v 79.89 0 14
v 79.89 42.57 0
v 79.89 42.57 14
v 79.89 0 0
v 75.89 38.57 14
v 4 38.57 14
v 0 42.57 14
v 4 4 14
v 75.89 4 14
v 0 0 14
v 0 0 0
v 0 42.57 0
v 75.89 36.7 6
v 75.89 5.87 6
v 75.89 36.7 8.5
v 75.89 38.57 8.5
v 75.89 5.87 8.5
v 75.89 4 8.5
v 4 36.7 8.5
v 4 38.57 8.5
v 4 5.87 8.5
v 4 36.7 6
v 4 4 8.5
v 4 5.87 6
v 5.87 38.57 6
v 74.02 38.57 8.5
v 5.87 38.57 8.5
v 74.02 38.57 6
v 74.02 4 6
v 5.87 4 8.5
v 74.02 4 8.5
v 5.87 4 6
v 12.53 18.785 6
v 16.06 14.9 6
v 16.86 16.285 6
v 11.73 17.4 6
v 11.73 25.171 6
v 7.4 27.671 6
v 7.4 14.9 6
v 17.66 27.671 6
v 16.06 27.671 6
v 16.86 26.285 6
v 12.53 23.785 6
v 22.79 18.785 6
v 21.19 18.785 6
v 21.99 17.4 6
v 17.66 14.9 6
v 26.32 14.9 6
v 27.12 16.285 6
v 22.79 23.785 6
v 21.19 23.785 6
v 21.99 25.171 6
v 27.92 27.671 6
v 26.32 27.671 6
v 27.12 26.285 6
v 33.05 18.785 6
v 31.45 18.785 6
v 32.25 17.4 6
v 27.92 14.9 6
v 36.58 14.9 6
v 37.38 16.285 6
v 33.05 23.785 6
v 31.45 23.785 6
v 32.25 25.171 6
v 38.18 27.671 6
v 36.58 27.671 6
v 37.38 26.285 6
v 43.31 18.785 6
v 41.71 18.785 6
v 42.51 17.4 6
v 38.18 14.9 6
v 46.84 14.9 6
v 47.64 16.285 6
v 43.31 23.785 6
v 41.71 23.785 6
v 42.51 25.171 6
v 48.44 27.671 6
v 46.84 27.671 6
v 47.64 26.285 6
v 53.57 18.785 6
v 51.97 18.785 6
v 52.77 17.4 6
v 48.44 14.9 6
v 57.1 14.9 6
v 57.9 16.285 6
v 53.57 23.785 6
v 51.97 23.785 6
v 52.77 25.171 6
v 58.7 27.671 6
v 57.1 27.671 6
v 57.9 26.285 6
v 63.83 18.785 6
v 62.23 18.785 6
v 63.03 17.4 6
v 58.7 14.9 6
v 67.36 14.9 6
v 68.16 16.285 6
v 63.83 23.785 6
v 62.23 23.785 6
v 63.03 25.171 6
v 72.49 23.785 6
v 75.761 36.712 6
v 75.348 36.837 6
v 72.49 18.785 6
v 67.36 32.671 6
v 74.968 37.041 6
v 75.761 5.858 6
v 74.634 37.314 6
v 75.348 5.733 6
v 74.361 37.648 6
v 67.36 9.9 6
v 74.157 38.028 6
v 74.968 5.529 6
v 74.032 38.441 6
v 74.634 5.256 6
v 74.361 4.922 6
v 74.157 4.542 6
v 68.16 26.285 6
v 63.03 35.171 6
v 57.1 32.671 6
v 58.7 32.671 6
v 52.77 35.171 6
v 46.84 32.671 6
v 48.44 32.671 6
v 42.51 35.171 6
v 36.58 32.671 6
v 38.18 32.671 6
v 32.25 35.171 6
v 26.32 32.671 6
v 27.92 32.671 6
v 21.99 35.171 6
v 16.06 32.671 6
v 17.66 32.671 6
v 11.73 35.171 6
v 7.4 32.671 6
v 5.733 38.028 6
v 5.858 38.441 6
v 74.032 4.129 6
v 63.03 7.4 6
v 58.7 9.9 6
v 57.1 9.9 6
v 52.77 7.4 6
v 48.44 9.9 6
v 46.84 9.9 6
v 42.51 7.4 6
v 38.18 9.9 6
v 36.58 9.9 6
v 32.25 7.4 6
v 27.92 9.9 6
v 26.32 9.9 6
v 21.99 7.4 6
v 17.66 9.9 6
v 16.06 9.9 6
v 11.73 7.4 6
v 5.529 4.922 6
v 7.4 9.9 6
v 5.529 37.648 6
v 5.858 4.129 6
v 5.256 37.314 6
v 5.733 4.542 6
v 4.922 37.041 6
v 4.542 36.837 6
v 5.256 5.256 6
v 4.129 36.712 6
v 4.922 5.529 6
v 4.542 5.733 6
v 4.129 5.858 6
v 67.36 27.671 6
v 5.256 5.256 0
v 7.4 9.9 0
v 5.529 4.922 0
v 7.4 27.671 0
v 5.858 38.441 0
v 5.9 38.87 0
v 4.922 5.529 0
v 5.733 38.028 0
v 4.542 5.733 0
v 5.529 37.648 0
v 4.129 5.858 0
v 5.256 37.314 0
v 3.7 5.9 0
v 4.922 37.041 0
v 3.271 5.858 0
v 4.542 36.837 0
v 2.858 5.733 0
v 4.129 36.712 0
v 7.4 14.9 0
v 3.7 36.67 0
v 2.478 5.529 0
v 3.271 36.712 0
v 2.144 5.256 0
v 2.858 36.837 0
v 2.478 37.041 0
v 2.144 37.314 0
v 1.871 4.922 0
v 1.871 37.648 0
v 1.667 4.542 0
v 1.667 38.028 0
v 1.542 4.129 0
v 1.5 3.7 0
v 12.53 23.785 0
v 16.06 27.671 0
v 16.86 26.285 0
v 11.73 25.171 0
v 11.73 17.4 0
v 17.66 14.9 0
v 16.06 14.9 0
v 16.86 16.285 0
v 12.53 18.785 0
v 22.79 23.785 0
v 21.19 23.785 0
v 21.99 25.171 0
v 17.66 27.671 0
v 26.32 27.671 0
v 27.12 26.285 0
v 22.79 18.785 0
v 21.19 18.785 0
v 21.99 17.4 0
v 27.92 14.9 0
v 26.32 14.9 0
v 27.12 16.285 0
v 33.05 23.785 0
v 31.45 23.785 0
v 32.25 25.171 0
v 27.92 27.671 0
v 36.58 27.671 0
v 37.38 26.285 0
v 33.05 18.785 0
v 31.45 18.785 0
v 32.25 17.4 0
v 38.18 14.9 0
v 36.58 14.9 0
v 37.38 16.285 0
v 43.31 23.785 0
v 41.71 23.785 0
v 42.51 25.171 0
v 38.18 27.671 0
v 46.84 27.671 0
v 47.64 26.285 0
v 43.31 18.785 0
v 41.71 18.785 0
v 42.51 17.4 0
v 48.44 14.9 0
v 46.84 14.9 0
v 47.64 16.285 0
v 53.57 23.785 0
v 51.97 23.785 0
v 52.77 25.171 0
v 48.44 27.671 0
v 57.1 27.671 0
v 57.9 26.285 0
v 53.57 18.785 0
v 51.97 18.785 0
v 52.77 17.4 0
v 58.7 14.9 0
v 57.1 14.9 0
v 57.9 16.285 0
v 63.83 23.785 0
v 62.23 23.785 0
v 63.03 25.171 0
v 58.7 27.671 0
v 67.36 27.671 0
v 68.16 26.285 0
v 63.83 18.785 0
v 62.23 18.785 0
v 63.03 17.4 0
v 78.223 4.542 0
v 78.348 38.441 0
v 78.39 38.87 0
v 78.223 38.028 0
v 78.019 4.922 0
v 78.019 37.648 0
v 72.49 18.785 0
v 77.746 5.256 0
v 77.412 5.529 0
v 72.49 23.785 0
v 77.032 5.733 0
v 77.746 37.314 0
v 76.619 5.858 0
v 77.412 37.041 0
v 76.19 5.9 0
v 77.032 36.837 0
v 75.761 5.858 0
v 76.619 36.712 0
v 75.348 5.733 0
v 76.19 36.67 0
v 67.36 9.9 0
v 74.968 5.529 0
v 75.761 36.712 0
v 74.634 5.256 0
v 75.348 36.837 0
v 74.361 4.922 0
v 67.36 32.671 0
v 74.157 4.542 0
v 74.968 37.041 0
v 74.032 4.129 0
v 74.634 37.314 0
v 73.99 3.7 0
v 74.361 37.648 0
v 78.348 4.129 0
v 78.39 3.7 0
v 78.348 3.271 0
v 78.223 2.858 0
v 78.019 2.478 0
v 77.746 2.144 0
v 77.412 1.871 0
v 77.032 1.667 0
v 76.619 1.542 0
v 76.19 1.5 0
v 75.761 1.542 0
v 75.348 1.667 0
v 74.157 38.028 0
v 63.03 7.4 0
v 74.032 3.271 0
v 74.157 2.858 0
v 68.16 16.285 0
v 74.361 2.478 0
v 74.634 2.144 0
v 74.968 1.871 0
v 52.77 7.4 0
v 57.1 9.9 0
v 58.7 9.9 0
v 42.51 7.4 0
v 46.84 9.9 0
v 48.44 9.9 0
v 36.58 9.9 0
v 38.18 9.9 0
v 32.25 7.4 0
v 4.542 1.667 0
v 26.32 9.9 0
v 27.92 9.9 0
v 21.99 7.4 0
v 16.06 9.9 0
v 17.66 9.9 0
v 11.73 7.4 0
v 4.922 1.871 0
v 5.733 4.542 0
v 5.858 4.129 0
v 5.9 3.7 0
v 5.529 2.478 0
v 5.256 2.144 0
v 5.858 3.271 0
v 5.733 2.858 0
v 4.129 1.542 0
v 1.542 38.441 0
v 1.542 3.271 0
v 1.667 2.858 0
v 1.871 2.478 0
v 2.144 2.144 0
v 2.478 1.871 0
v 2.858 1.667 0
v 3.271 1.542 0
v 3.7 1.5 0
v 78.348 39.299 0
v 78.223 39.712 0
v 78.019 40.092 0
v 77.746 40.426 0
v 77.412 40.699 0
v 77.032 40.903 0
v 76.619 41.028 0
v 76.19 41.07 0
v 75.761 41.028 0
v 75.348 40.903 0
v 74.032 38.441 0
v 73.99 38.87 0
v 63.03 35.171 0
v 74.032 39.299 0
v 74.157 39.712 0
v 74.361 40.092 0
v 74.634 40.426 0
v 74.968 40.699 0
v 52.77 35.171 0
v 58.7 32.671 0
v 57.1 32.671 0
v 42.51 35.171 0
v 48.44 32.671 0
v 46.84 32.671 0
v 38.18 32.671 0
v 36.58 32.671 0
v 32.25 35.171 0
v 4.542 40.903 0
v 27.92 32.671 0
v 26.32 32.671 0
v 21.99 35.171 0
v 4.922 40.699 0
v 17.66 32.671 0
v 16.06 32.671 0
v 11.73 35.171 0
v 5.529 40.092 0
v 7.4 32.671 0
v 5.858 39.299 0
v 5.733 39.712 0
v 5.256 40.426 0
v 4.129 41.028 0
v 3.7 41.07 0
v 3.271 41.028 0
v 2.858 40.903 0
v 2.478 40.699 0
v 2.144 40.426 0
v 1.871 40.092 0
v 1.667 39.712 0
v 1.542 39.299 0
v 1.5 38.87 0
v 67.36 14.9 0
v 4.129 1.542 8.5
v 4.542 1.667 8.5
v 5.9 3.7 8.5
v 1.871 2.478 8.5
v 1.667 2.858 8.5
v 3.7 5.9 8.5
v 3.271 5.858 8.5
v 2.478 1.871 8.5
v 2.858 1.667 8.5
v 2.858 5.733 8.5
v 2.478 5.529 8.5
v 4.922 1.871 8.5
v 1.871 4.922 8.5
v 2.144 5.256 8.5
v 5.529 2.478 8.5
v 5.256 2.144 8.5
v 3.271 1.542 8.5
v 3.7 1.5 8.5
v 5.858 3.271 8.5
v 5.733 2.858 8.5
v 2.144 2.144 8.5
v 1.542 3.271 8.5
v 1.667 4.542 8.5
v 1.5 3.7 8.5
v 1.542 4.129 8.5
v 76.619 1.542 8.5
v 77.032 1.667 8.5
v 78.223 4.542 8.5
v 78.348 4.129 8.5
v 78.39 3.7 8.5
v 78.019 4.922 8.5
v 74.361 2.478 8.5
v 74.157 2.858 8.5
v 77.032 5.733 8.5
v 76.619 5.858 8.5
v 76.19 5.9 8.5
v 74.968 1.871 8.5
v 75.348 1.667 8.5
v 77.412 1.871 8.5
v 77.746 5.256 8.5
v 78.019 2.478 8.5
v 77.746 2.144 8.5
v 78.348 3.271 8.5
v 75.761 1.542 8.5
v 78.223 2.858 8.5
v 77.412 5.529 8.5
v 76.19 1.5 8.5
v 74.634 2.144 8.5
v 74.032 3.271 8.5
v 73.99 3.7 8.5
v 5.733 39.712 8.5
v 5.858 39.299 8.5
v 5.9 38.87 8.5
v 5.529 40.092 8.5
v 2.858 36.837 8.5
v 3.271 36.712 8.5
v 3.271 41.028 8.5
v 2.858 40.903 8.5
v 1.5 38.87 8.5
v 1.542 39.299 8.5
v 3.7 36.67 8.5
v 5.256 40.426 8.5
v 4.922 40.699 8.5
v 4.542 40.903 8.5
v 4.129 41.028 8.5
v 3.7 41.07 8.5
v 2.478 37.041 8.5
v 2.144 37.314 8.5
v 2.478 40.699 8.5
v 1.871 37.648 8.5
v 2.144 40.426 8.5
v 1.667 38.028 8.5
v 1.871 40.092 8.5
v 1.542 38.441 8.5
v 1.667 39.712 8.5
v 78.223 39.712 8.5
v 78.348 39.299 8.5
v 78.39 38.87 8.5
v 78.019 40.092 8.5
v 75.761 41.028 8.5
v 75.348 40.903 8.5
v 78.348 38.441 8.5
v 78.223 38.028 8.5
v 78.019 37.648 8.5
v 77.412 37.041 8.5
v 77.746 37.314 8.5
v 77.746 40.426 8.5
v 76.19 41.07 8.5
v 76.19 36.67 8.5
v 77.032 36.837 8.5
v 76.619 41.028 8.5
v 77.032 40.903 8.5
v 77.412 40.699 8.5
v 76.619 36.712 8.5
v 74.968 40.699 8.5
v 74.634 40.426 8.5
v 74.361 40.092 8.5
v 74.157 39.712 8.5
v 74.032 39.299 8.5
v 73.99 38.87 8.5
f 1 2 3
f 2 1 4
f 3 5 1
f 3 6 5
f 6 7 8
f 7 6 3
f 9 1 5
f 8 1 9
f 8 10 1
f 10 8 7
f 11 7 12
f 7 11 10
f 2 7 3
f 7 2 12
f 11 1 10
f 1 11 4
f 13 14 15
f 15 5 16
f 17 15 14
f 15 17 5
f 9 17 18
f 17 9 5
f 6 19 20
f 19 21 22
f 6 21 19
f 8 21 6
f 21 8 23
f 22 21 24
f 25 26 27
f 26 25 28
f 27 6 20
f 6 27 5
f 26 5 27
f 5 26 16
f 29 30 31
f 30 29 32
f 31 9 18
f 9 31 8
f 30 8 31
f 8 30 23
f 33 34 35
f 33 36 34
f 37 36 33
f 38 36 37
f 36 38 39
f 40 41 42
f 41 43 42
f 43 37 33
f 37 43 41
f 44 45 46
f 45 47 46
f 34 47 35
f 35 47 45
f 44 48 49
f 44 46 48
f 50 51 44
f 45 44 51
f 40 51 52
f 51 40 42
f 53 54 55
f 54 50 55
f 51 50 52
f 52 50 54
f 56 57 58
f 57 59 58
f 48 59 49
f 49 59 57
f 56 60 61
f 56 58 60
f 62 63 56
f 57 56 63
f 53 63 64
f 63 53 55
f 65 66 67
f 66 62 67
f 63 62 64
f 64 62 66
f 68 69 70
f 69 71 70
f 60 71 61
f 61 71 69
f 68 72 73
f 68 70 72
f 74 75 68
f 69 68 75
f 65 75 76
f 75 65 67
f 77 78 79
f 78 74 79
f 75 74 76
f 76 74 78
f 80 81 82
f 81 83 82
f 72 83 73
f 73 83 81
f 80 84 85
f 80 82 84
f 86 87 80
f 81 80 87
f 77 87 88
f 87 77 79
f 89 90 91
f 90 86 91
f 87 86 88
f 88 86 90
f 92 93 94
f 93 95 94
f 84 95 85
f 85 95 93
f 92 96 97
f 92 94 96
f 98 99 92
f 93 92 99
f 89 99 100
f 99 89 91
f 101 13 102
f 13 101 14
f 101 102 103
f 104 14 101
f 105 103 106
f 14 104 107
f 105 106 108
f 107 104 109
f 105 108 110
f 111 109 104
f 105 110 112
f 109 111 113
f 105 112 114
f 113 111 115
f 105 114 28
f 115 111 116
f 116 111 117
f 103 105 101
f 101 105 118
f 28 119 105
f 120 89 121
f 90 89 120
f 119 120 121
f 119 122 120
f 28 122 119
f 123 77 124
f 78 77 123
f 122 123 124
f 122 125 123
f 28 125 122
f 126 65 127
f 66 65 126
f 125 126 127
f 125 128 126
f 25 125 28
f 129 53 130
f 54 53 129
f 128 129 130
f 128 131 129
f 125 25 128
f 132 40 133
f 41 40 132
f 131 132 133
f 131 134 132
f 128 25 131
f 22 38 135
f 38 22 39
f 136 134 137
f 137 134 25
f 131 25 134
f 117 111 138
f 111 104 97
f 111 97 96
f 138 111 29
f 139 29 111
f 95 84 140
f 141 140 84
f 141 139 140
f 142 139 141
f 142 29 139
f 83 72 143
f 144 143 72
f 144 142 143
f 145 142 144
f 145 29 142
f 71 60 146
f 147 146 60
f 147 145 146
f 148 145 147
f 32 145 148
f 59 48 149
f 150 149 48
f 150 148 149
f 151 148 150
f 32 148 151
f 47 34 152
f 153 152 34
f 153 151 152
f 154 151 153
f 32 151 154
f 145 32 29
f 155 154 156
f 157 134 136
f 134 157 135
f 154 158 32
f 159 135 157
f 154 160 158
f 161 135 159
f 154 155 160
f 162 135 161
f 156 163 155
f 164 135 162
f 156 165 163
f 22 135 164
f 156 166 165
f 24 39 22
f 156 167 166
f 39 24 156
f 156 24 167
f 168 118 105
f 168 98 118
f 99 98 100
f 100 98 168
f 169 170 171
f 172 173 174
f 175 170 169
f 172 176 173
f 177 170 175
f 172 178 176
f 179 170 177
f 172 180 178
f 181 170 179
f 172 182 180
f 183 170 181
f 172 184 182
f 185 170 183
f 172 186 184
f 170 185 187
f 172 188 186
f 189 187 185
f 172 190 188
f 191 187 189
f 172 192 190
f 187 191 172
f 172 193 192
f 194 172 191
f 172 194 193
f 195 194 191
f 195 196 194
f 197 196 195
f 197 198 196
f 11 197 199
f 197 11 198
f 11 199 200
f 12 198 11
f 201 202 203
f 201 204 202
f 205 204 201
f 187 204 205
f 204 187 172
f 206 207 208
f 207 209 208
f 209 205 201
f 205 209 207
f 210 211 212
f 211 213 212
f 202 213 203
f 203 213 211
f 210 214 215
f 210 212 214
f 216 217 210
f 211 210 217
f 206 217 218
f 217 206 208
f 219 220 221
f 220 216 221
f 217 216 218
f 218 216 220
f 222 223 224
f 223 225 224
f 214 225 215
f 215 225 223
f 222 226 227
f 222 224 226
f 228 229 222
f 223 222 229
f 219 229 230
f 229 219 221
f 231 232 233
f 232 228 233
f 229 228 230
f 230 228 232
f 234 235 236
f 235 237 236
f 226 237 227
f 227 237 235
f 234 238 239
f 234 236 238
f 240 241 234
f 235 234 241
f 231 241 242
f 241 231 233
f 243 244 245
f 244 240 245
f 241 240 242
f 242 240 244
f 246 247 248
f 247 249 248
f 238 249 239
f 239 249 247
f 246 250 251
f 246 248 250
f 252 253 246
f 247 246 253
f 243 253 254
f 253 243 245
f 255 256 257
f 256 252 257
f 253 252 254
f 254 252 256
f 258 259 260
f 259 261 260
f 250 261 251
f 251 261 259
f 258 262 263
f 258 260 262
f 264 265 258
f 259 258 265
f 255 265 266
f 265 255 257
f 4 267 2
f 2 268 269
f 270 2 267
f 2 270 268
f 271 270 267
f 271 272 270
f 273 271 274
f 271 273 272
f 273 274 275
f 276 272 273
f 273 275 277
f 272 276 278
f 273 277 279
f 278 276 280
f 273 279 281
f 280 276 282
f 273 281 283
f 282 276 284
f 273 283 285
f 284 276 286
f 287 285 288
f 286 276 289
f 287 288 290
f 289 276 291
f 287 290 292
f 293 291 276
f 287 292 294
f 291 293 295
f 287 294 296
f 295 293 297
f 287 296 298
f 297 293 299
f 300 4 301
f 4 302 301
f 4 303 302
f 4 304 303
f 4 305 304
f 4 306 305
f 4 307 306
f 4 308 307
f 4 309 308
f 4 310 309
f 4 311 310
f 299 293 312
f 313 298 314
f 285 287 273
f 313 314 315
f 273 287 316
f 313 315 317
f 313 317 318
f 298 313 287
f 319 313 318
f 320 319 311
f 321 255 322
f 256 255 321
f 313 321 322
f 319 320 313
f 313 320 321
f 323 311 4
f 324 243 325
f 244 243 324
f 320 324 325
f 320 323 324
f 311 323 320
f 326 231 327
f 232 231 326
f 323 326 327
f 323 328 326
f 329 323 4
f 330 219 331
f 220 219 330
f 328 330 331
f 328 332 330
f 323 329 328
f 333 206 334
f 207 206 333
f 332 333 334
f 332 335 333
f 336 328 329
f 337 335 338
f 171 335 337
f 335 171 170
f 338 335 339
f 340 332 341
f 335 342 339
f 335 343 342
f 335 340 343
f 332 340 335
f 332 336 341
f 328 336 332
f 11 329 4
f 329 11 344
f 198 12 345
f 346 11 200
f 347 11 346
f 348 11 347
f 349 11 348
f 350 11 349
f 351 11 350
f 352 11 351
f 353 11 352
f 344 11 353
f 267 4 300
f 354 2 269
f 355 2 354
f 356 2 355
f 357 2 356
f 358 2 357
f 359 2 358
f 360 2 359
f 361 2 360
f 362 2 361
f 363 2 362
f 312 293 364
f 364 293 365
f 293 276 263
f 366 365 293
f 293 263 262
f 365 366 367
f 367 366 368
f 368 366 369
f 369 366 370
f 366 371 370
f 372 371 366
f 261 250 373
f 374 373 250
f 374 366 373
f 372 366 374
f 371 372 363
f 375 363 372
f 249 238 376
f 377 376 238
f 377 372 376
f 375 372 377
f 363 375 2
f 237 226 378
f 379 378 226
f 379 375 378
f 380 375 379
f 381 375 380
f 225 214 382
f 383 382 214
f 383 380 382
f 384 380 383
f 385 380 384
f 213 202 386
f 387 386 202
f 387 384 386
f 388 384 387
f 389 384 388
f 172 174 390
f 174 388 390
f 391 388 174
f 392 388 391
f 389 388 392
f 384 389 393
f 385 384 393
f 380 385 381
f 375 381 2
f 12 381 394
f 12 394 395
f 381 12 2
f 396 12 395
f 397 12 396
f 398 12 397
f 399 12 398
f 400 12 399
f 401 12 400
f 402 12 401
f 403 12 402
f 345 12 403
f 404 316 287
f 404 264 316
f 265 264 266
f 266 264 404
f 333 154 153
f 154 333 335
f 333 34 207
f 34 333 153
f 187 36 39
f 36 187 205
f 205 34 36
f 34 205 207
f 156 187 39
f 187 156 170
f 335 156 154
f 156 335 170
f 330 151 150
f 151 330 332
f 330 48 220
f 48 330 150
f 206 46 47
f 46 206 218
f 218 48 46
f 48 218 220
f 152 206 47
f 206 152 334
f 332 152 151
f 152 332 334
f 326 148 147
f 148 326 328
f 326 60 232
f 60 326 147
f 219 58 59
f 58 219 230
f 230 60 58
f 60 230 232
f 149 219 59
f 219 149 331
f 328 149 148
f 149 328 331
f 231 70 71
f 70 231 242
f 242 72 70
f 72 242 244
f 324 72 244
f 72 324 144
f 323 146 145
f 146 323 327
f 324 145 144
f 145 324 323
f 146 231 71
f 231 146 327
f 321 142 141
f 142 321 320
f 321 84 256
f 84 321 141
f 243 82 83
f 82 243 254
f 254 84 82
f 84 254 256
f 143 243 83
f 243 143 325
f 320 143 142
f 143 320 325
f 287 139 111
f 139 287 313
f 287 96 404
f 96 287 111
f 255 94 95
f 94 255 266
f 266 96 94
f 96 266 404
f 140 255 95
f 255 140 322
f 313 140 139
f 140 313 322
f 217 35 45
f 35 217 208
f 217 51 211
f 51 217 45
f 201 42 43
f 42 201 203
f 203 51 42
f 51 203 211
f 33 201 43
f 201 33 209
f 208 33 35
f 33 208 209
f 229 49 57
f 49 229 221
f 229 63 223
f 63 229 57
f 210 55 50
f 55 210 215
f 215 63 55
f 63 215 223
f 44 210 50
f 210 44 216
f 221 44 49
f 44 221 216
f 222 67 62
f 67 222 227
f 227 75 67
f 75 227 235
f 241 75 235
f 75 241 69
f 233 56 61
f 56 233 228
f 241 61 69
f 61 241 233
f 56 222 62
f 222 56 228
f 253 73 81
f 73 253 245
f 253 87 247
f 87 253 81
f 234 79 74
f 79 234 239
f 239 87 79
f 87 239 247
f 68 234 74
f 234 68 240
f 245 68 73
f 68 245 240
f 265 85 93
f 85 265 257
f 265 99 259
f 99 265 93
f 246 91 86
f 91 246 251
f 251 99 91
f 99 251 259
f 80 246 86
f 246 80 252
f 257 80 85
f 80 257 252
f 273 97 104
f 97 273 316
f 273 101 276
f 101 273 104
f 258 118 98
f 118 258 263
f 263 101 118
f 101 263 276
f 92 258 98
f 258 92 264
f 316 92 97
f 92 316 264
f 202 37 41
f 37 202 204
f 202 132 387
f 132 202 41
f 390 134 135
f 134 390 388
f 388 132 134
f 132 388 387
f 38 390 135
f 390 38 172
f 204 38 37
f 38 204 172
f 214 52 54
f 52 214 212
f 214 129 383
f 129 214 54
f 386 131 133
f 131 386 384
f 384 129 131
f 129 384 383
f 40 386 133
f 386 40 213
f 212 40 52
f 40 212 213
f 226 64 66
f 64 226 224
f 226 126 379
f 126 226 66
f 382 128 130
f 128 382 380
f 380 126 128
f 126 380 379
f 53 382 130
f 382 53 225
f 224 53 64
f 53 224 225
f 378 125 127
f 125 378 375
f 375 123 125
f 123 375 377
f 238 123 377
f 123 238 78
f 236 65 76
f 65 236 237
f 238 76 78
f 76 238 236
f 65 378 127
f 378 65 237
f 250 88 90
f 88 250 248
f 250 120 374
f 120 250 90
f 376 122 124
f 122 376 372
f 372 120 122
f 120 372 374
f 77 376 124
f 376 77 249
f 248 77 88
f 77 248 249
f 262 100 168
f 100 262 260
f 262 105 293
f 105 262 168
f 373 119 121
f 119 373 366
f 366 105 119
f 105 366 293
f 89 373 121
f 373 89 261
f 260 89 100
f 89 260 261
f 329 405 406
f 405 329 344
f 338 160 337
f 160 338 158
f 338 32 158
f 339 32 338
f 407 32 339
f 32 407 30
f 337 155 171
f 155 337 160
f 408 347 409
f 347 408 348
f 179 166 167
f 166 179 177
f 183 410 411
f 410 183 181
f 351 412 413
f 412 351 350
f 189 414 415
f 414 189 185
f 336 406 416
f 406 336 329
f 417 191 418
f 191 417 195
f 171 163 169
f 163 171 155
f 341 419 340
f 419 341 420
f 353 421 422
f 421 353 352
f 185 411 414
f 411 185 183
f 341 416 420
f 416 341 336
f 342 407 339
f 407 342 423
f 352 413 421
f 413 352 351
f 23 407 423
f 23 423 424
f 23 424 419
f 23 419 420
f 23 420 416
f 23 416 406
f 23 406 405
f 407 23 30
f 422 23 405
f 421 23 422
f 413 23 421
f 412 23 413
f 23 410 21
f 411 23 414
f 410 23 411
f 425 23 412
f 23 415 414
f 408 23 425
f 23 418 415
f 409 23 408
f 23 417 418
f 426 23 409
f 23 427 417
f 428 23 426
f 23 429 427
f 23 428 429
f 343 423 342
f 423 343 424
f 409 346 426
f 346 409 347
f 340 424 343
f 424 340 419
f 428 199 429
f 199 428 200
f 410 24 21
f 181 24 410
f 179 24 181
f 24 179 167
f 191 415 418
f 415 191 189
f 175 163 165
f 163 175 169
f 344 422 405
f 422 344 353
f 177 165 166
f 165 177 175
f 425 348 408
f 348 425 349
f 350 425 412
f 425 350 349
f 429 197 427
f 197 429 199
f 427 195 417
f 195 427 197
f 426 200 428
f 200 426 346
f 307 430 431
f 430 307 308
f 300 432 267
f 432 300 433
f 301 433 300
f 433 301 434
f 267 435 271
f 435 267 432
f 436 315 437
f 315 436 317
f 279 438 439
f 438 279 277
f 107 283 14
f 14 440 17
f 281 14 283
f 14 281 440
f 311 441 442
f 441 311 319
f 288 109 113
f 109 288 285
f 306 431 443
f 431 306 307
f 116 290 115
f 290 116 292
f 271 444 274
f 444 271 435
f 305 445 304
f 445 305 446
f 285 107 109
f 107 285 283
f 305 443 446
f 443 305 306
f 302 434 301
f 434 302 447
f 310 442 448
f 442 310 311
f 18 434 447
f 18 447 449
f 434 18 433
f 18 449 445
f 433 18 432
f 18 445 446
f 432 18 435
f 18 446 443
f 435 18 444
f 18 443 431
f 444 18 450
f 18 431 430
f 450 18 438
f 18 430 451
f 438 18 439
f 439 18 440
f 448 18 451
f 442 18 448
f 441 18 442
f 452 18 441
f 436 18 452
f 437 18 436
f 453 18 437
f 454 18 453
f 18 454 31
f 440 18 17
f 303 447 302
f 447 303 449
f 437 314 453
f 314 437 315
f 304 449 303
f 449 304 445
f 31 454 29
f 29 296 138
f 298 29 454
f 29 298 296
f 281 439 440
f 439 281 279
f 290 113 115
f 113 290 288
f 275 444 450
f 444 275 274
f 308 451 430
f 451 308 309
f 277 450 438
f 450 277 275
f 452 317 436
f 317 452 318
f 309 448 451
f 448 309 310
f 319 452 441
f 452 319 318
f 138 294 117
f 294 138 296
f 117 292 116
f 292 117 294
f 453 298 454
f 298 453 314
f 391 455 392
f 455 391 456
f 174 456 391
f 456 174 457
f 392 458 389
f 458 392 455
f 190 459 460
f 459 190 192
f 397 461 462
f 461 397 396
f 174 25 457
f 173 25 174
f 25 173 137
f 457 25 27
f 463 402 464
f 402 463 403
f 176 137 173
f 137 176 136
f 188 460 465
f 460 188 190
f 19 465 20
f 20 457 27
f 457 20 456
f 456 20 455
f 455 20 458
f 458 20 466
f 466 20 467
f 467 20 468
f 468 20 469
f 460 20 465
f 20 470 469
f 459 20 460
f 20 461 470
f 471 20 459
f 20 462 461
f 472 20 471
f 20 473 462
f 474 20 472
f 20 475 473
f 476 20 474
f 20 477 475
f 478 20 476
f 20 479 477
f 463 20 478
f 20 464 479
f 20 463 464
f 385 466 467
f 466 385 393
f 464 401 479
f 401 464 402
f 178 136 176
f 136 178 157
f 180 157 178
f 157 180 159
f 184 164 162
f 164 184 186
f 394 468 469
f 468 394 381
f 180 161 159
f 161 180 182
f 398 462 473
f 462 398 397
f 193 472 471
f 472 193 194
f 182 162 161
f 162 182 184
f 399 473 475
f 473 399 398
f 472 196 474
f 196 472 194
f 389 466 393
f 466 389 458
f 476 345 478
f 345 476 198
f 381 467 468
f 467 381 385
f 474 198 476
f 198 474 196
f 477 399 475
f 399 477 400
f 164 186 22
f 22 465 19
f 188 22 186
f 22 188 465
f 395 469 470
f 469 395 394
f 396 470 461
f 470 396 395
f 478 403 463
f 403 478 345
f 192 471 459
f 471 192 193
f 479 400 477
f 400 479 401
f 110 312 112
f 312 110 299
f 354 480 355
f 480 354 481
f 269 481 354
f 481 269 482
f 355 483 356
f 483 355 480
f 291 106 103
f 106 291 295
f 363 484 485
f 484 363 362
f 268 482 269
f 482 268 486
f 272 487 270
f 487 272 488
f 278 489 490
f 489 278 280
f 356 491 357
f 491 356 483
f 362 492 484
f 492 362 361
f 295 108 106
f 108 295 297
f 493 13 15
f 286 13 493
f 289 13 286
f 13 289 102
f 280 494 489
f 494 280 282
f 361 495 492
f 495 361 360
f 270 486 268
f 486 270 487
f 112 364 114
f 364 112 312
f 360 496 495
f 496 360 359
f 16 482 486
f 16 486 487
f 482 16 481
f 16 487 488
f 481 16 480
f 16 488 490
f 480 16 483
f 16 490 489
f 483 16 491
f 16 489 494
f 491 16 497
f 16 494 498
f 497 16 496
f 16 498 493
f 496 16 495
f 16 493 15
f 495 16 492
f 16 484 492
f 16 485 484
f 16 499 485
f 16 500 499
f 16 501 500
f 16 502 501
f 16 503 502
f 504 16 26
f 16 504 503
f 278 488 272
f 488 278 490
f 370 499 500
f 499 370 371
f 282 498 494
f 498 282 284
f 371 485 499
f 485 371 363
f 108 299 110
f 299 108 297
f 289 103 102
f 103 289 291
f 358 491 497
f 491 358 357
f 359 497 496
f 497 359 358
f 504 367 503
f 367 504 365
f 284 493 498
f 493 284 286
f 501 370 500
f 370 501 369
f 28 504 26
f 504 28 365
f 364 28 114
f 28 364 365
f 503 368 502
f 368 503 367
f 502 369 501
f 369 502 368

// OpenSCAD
$fn = 32;

// ----------------------------------------------------------------------
// Honeycomb panel: 79.89 x 42.57 mm, 18 cells of 10 mm
// ----------------------------------------------------------------------

// --- parameters (mm) ---
panel_w = 79.89;          // panel width
panel_d = 42.57;          // panel depth
thick = 6;                // panel thickness
cell_r = 5;               // hex cell circumradius
pitch = 10.26;            // hex cell pitch (centre to centre)
web = 1.6;                // web between the cells
columns = 6;              // columns of cells
rows = 3;                 // rows of cells
cell_count = 18;          // total cells
shift_x = 11.73;          // first cell offset in x
shift_y = 12.4;           // first cell offset in y
mount_d = 4.4;            // corner mounting holes
hole_off = 3.7;           // mounting hole offset from the corners
rim_h = 14;               // rim height
rim_t = 4;                // rim wall thickness

difference() {
  union() {
    cube([panel_w, panel_d, thick]);
    /* rim around the panel, sunk 1 mm into the plate */
    translate([0, 0, thick - 1]) difference() {
      cube([panel_w, panel_d, rim_h - thick + 1]);
      translate([rim_t, rim_t, -2.5]) cube([panel_w - 2 * rim_t, panel_d - 2 * rim_t, rim_h - thick + 6]);
    }
  }
  /* hexagonal cells, point-up, cut right through the plate */
  for (row = [0 : rows - 1]) {
    for (col = [0 : columns - 1]) {
      translate([shift_x + col * pitch + (row % 2) * pitch / 2, shift_y + row * pitch * 0.866025, -2.5]) rotate([0, 0, 30]) cylinder(h = thick + 5, d = 2 * cell_r, $fn = 6);
    }
  }
  /* corner mounting holes, clear of the outer cell web */
  translate([3.7, 3.7, -2.5]) cylinder(h = thick + 5, d = mount_d);
  translate([76.19, 3.7, -2.5]) cylinder(h = thick + 5, d = mount_d);
  translate([3.7, 38.87, -2.5]) cylinder(h = thick + 5, d = mount_d);
  translate([76.19, 38.87, -2.5]) cylinder(h = thick + 5, d = mount_d);
}
